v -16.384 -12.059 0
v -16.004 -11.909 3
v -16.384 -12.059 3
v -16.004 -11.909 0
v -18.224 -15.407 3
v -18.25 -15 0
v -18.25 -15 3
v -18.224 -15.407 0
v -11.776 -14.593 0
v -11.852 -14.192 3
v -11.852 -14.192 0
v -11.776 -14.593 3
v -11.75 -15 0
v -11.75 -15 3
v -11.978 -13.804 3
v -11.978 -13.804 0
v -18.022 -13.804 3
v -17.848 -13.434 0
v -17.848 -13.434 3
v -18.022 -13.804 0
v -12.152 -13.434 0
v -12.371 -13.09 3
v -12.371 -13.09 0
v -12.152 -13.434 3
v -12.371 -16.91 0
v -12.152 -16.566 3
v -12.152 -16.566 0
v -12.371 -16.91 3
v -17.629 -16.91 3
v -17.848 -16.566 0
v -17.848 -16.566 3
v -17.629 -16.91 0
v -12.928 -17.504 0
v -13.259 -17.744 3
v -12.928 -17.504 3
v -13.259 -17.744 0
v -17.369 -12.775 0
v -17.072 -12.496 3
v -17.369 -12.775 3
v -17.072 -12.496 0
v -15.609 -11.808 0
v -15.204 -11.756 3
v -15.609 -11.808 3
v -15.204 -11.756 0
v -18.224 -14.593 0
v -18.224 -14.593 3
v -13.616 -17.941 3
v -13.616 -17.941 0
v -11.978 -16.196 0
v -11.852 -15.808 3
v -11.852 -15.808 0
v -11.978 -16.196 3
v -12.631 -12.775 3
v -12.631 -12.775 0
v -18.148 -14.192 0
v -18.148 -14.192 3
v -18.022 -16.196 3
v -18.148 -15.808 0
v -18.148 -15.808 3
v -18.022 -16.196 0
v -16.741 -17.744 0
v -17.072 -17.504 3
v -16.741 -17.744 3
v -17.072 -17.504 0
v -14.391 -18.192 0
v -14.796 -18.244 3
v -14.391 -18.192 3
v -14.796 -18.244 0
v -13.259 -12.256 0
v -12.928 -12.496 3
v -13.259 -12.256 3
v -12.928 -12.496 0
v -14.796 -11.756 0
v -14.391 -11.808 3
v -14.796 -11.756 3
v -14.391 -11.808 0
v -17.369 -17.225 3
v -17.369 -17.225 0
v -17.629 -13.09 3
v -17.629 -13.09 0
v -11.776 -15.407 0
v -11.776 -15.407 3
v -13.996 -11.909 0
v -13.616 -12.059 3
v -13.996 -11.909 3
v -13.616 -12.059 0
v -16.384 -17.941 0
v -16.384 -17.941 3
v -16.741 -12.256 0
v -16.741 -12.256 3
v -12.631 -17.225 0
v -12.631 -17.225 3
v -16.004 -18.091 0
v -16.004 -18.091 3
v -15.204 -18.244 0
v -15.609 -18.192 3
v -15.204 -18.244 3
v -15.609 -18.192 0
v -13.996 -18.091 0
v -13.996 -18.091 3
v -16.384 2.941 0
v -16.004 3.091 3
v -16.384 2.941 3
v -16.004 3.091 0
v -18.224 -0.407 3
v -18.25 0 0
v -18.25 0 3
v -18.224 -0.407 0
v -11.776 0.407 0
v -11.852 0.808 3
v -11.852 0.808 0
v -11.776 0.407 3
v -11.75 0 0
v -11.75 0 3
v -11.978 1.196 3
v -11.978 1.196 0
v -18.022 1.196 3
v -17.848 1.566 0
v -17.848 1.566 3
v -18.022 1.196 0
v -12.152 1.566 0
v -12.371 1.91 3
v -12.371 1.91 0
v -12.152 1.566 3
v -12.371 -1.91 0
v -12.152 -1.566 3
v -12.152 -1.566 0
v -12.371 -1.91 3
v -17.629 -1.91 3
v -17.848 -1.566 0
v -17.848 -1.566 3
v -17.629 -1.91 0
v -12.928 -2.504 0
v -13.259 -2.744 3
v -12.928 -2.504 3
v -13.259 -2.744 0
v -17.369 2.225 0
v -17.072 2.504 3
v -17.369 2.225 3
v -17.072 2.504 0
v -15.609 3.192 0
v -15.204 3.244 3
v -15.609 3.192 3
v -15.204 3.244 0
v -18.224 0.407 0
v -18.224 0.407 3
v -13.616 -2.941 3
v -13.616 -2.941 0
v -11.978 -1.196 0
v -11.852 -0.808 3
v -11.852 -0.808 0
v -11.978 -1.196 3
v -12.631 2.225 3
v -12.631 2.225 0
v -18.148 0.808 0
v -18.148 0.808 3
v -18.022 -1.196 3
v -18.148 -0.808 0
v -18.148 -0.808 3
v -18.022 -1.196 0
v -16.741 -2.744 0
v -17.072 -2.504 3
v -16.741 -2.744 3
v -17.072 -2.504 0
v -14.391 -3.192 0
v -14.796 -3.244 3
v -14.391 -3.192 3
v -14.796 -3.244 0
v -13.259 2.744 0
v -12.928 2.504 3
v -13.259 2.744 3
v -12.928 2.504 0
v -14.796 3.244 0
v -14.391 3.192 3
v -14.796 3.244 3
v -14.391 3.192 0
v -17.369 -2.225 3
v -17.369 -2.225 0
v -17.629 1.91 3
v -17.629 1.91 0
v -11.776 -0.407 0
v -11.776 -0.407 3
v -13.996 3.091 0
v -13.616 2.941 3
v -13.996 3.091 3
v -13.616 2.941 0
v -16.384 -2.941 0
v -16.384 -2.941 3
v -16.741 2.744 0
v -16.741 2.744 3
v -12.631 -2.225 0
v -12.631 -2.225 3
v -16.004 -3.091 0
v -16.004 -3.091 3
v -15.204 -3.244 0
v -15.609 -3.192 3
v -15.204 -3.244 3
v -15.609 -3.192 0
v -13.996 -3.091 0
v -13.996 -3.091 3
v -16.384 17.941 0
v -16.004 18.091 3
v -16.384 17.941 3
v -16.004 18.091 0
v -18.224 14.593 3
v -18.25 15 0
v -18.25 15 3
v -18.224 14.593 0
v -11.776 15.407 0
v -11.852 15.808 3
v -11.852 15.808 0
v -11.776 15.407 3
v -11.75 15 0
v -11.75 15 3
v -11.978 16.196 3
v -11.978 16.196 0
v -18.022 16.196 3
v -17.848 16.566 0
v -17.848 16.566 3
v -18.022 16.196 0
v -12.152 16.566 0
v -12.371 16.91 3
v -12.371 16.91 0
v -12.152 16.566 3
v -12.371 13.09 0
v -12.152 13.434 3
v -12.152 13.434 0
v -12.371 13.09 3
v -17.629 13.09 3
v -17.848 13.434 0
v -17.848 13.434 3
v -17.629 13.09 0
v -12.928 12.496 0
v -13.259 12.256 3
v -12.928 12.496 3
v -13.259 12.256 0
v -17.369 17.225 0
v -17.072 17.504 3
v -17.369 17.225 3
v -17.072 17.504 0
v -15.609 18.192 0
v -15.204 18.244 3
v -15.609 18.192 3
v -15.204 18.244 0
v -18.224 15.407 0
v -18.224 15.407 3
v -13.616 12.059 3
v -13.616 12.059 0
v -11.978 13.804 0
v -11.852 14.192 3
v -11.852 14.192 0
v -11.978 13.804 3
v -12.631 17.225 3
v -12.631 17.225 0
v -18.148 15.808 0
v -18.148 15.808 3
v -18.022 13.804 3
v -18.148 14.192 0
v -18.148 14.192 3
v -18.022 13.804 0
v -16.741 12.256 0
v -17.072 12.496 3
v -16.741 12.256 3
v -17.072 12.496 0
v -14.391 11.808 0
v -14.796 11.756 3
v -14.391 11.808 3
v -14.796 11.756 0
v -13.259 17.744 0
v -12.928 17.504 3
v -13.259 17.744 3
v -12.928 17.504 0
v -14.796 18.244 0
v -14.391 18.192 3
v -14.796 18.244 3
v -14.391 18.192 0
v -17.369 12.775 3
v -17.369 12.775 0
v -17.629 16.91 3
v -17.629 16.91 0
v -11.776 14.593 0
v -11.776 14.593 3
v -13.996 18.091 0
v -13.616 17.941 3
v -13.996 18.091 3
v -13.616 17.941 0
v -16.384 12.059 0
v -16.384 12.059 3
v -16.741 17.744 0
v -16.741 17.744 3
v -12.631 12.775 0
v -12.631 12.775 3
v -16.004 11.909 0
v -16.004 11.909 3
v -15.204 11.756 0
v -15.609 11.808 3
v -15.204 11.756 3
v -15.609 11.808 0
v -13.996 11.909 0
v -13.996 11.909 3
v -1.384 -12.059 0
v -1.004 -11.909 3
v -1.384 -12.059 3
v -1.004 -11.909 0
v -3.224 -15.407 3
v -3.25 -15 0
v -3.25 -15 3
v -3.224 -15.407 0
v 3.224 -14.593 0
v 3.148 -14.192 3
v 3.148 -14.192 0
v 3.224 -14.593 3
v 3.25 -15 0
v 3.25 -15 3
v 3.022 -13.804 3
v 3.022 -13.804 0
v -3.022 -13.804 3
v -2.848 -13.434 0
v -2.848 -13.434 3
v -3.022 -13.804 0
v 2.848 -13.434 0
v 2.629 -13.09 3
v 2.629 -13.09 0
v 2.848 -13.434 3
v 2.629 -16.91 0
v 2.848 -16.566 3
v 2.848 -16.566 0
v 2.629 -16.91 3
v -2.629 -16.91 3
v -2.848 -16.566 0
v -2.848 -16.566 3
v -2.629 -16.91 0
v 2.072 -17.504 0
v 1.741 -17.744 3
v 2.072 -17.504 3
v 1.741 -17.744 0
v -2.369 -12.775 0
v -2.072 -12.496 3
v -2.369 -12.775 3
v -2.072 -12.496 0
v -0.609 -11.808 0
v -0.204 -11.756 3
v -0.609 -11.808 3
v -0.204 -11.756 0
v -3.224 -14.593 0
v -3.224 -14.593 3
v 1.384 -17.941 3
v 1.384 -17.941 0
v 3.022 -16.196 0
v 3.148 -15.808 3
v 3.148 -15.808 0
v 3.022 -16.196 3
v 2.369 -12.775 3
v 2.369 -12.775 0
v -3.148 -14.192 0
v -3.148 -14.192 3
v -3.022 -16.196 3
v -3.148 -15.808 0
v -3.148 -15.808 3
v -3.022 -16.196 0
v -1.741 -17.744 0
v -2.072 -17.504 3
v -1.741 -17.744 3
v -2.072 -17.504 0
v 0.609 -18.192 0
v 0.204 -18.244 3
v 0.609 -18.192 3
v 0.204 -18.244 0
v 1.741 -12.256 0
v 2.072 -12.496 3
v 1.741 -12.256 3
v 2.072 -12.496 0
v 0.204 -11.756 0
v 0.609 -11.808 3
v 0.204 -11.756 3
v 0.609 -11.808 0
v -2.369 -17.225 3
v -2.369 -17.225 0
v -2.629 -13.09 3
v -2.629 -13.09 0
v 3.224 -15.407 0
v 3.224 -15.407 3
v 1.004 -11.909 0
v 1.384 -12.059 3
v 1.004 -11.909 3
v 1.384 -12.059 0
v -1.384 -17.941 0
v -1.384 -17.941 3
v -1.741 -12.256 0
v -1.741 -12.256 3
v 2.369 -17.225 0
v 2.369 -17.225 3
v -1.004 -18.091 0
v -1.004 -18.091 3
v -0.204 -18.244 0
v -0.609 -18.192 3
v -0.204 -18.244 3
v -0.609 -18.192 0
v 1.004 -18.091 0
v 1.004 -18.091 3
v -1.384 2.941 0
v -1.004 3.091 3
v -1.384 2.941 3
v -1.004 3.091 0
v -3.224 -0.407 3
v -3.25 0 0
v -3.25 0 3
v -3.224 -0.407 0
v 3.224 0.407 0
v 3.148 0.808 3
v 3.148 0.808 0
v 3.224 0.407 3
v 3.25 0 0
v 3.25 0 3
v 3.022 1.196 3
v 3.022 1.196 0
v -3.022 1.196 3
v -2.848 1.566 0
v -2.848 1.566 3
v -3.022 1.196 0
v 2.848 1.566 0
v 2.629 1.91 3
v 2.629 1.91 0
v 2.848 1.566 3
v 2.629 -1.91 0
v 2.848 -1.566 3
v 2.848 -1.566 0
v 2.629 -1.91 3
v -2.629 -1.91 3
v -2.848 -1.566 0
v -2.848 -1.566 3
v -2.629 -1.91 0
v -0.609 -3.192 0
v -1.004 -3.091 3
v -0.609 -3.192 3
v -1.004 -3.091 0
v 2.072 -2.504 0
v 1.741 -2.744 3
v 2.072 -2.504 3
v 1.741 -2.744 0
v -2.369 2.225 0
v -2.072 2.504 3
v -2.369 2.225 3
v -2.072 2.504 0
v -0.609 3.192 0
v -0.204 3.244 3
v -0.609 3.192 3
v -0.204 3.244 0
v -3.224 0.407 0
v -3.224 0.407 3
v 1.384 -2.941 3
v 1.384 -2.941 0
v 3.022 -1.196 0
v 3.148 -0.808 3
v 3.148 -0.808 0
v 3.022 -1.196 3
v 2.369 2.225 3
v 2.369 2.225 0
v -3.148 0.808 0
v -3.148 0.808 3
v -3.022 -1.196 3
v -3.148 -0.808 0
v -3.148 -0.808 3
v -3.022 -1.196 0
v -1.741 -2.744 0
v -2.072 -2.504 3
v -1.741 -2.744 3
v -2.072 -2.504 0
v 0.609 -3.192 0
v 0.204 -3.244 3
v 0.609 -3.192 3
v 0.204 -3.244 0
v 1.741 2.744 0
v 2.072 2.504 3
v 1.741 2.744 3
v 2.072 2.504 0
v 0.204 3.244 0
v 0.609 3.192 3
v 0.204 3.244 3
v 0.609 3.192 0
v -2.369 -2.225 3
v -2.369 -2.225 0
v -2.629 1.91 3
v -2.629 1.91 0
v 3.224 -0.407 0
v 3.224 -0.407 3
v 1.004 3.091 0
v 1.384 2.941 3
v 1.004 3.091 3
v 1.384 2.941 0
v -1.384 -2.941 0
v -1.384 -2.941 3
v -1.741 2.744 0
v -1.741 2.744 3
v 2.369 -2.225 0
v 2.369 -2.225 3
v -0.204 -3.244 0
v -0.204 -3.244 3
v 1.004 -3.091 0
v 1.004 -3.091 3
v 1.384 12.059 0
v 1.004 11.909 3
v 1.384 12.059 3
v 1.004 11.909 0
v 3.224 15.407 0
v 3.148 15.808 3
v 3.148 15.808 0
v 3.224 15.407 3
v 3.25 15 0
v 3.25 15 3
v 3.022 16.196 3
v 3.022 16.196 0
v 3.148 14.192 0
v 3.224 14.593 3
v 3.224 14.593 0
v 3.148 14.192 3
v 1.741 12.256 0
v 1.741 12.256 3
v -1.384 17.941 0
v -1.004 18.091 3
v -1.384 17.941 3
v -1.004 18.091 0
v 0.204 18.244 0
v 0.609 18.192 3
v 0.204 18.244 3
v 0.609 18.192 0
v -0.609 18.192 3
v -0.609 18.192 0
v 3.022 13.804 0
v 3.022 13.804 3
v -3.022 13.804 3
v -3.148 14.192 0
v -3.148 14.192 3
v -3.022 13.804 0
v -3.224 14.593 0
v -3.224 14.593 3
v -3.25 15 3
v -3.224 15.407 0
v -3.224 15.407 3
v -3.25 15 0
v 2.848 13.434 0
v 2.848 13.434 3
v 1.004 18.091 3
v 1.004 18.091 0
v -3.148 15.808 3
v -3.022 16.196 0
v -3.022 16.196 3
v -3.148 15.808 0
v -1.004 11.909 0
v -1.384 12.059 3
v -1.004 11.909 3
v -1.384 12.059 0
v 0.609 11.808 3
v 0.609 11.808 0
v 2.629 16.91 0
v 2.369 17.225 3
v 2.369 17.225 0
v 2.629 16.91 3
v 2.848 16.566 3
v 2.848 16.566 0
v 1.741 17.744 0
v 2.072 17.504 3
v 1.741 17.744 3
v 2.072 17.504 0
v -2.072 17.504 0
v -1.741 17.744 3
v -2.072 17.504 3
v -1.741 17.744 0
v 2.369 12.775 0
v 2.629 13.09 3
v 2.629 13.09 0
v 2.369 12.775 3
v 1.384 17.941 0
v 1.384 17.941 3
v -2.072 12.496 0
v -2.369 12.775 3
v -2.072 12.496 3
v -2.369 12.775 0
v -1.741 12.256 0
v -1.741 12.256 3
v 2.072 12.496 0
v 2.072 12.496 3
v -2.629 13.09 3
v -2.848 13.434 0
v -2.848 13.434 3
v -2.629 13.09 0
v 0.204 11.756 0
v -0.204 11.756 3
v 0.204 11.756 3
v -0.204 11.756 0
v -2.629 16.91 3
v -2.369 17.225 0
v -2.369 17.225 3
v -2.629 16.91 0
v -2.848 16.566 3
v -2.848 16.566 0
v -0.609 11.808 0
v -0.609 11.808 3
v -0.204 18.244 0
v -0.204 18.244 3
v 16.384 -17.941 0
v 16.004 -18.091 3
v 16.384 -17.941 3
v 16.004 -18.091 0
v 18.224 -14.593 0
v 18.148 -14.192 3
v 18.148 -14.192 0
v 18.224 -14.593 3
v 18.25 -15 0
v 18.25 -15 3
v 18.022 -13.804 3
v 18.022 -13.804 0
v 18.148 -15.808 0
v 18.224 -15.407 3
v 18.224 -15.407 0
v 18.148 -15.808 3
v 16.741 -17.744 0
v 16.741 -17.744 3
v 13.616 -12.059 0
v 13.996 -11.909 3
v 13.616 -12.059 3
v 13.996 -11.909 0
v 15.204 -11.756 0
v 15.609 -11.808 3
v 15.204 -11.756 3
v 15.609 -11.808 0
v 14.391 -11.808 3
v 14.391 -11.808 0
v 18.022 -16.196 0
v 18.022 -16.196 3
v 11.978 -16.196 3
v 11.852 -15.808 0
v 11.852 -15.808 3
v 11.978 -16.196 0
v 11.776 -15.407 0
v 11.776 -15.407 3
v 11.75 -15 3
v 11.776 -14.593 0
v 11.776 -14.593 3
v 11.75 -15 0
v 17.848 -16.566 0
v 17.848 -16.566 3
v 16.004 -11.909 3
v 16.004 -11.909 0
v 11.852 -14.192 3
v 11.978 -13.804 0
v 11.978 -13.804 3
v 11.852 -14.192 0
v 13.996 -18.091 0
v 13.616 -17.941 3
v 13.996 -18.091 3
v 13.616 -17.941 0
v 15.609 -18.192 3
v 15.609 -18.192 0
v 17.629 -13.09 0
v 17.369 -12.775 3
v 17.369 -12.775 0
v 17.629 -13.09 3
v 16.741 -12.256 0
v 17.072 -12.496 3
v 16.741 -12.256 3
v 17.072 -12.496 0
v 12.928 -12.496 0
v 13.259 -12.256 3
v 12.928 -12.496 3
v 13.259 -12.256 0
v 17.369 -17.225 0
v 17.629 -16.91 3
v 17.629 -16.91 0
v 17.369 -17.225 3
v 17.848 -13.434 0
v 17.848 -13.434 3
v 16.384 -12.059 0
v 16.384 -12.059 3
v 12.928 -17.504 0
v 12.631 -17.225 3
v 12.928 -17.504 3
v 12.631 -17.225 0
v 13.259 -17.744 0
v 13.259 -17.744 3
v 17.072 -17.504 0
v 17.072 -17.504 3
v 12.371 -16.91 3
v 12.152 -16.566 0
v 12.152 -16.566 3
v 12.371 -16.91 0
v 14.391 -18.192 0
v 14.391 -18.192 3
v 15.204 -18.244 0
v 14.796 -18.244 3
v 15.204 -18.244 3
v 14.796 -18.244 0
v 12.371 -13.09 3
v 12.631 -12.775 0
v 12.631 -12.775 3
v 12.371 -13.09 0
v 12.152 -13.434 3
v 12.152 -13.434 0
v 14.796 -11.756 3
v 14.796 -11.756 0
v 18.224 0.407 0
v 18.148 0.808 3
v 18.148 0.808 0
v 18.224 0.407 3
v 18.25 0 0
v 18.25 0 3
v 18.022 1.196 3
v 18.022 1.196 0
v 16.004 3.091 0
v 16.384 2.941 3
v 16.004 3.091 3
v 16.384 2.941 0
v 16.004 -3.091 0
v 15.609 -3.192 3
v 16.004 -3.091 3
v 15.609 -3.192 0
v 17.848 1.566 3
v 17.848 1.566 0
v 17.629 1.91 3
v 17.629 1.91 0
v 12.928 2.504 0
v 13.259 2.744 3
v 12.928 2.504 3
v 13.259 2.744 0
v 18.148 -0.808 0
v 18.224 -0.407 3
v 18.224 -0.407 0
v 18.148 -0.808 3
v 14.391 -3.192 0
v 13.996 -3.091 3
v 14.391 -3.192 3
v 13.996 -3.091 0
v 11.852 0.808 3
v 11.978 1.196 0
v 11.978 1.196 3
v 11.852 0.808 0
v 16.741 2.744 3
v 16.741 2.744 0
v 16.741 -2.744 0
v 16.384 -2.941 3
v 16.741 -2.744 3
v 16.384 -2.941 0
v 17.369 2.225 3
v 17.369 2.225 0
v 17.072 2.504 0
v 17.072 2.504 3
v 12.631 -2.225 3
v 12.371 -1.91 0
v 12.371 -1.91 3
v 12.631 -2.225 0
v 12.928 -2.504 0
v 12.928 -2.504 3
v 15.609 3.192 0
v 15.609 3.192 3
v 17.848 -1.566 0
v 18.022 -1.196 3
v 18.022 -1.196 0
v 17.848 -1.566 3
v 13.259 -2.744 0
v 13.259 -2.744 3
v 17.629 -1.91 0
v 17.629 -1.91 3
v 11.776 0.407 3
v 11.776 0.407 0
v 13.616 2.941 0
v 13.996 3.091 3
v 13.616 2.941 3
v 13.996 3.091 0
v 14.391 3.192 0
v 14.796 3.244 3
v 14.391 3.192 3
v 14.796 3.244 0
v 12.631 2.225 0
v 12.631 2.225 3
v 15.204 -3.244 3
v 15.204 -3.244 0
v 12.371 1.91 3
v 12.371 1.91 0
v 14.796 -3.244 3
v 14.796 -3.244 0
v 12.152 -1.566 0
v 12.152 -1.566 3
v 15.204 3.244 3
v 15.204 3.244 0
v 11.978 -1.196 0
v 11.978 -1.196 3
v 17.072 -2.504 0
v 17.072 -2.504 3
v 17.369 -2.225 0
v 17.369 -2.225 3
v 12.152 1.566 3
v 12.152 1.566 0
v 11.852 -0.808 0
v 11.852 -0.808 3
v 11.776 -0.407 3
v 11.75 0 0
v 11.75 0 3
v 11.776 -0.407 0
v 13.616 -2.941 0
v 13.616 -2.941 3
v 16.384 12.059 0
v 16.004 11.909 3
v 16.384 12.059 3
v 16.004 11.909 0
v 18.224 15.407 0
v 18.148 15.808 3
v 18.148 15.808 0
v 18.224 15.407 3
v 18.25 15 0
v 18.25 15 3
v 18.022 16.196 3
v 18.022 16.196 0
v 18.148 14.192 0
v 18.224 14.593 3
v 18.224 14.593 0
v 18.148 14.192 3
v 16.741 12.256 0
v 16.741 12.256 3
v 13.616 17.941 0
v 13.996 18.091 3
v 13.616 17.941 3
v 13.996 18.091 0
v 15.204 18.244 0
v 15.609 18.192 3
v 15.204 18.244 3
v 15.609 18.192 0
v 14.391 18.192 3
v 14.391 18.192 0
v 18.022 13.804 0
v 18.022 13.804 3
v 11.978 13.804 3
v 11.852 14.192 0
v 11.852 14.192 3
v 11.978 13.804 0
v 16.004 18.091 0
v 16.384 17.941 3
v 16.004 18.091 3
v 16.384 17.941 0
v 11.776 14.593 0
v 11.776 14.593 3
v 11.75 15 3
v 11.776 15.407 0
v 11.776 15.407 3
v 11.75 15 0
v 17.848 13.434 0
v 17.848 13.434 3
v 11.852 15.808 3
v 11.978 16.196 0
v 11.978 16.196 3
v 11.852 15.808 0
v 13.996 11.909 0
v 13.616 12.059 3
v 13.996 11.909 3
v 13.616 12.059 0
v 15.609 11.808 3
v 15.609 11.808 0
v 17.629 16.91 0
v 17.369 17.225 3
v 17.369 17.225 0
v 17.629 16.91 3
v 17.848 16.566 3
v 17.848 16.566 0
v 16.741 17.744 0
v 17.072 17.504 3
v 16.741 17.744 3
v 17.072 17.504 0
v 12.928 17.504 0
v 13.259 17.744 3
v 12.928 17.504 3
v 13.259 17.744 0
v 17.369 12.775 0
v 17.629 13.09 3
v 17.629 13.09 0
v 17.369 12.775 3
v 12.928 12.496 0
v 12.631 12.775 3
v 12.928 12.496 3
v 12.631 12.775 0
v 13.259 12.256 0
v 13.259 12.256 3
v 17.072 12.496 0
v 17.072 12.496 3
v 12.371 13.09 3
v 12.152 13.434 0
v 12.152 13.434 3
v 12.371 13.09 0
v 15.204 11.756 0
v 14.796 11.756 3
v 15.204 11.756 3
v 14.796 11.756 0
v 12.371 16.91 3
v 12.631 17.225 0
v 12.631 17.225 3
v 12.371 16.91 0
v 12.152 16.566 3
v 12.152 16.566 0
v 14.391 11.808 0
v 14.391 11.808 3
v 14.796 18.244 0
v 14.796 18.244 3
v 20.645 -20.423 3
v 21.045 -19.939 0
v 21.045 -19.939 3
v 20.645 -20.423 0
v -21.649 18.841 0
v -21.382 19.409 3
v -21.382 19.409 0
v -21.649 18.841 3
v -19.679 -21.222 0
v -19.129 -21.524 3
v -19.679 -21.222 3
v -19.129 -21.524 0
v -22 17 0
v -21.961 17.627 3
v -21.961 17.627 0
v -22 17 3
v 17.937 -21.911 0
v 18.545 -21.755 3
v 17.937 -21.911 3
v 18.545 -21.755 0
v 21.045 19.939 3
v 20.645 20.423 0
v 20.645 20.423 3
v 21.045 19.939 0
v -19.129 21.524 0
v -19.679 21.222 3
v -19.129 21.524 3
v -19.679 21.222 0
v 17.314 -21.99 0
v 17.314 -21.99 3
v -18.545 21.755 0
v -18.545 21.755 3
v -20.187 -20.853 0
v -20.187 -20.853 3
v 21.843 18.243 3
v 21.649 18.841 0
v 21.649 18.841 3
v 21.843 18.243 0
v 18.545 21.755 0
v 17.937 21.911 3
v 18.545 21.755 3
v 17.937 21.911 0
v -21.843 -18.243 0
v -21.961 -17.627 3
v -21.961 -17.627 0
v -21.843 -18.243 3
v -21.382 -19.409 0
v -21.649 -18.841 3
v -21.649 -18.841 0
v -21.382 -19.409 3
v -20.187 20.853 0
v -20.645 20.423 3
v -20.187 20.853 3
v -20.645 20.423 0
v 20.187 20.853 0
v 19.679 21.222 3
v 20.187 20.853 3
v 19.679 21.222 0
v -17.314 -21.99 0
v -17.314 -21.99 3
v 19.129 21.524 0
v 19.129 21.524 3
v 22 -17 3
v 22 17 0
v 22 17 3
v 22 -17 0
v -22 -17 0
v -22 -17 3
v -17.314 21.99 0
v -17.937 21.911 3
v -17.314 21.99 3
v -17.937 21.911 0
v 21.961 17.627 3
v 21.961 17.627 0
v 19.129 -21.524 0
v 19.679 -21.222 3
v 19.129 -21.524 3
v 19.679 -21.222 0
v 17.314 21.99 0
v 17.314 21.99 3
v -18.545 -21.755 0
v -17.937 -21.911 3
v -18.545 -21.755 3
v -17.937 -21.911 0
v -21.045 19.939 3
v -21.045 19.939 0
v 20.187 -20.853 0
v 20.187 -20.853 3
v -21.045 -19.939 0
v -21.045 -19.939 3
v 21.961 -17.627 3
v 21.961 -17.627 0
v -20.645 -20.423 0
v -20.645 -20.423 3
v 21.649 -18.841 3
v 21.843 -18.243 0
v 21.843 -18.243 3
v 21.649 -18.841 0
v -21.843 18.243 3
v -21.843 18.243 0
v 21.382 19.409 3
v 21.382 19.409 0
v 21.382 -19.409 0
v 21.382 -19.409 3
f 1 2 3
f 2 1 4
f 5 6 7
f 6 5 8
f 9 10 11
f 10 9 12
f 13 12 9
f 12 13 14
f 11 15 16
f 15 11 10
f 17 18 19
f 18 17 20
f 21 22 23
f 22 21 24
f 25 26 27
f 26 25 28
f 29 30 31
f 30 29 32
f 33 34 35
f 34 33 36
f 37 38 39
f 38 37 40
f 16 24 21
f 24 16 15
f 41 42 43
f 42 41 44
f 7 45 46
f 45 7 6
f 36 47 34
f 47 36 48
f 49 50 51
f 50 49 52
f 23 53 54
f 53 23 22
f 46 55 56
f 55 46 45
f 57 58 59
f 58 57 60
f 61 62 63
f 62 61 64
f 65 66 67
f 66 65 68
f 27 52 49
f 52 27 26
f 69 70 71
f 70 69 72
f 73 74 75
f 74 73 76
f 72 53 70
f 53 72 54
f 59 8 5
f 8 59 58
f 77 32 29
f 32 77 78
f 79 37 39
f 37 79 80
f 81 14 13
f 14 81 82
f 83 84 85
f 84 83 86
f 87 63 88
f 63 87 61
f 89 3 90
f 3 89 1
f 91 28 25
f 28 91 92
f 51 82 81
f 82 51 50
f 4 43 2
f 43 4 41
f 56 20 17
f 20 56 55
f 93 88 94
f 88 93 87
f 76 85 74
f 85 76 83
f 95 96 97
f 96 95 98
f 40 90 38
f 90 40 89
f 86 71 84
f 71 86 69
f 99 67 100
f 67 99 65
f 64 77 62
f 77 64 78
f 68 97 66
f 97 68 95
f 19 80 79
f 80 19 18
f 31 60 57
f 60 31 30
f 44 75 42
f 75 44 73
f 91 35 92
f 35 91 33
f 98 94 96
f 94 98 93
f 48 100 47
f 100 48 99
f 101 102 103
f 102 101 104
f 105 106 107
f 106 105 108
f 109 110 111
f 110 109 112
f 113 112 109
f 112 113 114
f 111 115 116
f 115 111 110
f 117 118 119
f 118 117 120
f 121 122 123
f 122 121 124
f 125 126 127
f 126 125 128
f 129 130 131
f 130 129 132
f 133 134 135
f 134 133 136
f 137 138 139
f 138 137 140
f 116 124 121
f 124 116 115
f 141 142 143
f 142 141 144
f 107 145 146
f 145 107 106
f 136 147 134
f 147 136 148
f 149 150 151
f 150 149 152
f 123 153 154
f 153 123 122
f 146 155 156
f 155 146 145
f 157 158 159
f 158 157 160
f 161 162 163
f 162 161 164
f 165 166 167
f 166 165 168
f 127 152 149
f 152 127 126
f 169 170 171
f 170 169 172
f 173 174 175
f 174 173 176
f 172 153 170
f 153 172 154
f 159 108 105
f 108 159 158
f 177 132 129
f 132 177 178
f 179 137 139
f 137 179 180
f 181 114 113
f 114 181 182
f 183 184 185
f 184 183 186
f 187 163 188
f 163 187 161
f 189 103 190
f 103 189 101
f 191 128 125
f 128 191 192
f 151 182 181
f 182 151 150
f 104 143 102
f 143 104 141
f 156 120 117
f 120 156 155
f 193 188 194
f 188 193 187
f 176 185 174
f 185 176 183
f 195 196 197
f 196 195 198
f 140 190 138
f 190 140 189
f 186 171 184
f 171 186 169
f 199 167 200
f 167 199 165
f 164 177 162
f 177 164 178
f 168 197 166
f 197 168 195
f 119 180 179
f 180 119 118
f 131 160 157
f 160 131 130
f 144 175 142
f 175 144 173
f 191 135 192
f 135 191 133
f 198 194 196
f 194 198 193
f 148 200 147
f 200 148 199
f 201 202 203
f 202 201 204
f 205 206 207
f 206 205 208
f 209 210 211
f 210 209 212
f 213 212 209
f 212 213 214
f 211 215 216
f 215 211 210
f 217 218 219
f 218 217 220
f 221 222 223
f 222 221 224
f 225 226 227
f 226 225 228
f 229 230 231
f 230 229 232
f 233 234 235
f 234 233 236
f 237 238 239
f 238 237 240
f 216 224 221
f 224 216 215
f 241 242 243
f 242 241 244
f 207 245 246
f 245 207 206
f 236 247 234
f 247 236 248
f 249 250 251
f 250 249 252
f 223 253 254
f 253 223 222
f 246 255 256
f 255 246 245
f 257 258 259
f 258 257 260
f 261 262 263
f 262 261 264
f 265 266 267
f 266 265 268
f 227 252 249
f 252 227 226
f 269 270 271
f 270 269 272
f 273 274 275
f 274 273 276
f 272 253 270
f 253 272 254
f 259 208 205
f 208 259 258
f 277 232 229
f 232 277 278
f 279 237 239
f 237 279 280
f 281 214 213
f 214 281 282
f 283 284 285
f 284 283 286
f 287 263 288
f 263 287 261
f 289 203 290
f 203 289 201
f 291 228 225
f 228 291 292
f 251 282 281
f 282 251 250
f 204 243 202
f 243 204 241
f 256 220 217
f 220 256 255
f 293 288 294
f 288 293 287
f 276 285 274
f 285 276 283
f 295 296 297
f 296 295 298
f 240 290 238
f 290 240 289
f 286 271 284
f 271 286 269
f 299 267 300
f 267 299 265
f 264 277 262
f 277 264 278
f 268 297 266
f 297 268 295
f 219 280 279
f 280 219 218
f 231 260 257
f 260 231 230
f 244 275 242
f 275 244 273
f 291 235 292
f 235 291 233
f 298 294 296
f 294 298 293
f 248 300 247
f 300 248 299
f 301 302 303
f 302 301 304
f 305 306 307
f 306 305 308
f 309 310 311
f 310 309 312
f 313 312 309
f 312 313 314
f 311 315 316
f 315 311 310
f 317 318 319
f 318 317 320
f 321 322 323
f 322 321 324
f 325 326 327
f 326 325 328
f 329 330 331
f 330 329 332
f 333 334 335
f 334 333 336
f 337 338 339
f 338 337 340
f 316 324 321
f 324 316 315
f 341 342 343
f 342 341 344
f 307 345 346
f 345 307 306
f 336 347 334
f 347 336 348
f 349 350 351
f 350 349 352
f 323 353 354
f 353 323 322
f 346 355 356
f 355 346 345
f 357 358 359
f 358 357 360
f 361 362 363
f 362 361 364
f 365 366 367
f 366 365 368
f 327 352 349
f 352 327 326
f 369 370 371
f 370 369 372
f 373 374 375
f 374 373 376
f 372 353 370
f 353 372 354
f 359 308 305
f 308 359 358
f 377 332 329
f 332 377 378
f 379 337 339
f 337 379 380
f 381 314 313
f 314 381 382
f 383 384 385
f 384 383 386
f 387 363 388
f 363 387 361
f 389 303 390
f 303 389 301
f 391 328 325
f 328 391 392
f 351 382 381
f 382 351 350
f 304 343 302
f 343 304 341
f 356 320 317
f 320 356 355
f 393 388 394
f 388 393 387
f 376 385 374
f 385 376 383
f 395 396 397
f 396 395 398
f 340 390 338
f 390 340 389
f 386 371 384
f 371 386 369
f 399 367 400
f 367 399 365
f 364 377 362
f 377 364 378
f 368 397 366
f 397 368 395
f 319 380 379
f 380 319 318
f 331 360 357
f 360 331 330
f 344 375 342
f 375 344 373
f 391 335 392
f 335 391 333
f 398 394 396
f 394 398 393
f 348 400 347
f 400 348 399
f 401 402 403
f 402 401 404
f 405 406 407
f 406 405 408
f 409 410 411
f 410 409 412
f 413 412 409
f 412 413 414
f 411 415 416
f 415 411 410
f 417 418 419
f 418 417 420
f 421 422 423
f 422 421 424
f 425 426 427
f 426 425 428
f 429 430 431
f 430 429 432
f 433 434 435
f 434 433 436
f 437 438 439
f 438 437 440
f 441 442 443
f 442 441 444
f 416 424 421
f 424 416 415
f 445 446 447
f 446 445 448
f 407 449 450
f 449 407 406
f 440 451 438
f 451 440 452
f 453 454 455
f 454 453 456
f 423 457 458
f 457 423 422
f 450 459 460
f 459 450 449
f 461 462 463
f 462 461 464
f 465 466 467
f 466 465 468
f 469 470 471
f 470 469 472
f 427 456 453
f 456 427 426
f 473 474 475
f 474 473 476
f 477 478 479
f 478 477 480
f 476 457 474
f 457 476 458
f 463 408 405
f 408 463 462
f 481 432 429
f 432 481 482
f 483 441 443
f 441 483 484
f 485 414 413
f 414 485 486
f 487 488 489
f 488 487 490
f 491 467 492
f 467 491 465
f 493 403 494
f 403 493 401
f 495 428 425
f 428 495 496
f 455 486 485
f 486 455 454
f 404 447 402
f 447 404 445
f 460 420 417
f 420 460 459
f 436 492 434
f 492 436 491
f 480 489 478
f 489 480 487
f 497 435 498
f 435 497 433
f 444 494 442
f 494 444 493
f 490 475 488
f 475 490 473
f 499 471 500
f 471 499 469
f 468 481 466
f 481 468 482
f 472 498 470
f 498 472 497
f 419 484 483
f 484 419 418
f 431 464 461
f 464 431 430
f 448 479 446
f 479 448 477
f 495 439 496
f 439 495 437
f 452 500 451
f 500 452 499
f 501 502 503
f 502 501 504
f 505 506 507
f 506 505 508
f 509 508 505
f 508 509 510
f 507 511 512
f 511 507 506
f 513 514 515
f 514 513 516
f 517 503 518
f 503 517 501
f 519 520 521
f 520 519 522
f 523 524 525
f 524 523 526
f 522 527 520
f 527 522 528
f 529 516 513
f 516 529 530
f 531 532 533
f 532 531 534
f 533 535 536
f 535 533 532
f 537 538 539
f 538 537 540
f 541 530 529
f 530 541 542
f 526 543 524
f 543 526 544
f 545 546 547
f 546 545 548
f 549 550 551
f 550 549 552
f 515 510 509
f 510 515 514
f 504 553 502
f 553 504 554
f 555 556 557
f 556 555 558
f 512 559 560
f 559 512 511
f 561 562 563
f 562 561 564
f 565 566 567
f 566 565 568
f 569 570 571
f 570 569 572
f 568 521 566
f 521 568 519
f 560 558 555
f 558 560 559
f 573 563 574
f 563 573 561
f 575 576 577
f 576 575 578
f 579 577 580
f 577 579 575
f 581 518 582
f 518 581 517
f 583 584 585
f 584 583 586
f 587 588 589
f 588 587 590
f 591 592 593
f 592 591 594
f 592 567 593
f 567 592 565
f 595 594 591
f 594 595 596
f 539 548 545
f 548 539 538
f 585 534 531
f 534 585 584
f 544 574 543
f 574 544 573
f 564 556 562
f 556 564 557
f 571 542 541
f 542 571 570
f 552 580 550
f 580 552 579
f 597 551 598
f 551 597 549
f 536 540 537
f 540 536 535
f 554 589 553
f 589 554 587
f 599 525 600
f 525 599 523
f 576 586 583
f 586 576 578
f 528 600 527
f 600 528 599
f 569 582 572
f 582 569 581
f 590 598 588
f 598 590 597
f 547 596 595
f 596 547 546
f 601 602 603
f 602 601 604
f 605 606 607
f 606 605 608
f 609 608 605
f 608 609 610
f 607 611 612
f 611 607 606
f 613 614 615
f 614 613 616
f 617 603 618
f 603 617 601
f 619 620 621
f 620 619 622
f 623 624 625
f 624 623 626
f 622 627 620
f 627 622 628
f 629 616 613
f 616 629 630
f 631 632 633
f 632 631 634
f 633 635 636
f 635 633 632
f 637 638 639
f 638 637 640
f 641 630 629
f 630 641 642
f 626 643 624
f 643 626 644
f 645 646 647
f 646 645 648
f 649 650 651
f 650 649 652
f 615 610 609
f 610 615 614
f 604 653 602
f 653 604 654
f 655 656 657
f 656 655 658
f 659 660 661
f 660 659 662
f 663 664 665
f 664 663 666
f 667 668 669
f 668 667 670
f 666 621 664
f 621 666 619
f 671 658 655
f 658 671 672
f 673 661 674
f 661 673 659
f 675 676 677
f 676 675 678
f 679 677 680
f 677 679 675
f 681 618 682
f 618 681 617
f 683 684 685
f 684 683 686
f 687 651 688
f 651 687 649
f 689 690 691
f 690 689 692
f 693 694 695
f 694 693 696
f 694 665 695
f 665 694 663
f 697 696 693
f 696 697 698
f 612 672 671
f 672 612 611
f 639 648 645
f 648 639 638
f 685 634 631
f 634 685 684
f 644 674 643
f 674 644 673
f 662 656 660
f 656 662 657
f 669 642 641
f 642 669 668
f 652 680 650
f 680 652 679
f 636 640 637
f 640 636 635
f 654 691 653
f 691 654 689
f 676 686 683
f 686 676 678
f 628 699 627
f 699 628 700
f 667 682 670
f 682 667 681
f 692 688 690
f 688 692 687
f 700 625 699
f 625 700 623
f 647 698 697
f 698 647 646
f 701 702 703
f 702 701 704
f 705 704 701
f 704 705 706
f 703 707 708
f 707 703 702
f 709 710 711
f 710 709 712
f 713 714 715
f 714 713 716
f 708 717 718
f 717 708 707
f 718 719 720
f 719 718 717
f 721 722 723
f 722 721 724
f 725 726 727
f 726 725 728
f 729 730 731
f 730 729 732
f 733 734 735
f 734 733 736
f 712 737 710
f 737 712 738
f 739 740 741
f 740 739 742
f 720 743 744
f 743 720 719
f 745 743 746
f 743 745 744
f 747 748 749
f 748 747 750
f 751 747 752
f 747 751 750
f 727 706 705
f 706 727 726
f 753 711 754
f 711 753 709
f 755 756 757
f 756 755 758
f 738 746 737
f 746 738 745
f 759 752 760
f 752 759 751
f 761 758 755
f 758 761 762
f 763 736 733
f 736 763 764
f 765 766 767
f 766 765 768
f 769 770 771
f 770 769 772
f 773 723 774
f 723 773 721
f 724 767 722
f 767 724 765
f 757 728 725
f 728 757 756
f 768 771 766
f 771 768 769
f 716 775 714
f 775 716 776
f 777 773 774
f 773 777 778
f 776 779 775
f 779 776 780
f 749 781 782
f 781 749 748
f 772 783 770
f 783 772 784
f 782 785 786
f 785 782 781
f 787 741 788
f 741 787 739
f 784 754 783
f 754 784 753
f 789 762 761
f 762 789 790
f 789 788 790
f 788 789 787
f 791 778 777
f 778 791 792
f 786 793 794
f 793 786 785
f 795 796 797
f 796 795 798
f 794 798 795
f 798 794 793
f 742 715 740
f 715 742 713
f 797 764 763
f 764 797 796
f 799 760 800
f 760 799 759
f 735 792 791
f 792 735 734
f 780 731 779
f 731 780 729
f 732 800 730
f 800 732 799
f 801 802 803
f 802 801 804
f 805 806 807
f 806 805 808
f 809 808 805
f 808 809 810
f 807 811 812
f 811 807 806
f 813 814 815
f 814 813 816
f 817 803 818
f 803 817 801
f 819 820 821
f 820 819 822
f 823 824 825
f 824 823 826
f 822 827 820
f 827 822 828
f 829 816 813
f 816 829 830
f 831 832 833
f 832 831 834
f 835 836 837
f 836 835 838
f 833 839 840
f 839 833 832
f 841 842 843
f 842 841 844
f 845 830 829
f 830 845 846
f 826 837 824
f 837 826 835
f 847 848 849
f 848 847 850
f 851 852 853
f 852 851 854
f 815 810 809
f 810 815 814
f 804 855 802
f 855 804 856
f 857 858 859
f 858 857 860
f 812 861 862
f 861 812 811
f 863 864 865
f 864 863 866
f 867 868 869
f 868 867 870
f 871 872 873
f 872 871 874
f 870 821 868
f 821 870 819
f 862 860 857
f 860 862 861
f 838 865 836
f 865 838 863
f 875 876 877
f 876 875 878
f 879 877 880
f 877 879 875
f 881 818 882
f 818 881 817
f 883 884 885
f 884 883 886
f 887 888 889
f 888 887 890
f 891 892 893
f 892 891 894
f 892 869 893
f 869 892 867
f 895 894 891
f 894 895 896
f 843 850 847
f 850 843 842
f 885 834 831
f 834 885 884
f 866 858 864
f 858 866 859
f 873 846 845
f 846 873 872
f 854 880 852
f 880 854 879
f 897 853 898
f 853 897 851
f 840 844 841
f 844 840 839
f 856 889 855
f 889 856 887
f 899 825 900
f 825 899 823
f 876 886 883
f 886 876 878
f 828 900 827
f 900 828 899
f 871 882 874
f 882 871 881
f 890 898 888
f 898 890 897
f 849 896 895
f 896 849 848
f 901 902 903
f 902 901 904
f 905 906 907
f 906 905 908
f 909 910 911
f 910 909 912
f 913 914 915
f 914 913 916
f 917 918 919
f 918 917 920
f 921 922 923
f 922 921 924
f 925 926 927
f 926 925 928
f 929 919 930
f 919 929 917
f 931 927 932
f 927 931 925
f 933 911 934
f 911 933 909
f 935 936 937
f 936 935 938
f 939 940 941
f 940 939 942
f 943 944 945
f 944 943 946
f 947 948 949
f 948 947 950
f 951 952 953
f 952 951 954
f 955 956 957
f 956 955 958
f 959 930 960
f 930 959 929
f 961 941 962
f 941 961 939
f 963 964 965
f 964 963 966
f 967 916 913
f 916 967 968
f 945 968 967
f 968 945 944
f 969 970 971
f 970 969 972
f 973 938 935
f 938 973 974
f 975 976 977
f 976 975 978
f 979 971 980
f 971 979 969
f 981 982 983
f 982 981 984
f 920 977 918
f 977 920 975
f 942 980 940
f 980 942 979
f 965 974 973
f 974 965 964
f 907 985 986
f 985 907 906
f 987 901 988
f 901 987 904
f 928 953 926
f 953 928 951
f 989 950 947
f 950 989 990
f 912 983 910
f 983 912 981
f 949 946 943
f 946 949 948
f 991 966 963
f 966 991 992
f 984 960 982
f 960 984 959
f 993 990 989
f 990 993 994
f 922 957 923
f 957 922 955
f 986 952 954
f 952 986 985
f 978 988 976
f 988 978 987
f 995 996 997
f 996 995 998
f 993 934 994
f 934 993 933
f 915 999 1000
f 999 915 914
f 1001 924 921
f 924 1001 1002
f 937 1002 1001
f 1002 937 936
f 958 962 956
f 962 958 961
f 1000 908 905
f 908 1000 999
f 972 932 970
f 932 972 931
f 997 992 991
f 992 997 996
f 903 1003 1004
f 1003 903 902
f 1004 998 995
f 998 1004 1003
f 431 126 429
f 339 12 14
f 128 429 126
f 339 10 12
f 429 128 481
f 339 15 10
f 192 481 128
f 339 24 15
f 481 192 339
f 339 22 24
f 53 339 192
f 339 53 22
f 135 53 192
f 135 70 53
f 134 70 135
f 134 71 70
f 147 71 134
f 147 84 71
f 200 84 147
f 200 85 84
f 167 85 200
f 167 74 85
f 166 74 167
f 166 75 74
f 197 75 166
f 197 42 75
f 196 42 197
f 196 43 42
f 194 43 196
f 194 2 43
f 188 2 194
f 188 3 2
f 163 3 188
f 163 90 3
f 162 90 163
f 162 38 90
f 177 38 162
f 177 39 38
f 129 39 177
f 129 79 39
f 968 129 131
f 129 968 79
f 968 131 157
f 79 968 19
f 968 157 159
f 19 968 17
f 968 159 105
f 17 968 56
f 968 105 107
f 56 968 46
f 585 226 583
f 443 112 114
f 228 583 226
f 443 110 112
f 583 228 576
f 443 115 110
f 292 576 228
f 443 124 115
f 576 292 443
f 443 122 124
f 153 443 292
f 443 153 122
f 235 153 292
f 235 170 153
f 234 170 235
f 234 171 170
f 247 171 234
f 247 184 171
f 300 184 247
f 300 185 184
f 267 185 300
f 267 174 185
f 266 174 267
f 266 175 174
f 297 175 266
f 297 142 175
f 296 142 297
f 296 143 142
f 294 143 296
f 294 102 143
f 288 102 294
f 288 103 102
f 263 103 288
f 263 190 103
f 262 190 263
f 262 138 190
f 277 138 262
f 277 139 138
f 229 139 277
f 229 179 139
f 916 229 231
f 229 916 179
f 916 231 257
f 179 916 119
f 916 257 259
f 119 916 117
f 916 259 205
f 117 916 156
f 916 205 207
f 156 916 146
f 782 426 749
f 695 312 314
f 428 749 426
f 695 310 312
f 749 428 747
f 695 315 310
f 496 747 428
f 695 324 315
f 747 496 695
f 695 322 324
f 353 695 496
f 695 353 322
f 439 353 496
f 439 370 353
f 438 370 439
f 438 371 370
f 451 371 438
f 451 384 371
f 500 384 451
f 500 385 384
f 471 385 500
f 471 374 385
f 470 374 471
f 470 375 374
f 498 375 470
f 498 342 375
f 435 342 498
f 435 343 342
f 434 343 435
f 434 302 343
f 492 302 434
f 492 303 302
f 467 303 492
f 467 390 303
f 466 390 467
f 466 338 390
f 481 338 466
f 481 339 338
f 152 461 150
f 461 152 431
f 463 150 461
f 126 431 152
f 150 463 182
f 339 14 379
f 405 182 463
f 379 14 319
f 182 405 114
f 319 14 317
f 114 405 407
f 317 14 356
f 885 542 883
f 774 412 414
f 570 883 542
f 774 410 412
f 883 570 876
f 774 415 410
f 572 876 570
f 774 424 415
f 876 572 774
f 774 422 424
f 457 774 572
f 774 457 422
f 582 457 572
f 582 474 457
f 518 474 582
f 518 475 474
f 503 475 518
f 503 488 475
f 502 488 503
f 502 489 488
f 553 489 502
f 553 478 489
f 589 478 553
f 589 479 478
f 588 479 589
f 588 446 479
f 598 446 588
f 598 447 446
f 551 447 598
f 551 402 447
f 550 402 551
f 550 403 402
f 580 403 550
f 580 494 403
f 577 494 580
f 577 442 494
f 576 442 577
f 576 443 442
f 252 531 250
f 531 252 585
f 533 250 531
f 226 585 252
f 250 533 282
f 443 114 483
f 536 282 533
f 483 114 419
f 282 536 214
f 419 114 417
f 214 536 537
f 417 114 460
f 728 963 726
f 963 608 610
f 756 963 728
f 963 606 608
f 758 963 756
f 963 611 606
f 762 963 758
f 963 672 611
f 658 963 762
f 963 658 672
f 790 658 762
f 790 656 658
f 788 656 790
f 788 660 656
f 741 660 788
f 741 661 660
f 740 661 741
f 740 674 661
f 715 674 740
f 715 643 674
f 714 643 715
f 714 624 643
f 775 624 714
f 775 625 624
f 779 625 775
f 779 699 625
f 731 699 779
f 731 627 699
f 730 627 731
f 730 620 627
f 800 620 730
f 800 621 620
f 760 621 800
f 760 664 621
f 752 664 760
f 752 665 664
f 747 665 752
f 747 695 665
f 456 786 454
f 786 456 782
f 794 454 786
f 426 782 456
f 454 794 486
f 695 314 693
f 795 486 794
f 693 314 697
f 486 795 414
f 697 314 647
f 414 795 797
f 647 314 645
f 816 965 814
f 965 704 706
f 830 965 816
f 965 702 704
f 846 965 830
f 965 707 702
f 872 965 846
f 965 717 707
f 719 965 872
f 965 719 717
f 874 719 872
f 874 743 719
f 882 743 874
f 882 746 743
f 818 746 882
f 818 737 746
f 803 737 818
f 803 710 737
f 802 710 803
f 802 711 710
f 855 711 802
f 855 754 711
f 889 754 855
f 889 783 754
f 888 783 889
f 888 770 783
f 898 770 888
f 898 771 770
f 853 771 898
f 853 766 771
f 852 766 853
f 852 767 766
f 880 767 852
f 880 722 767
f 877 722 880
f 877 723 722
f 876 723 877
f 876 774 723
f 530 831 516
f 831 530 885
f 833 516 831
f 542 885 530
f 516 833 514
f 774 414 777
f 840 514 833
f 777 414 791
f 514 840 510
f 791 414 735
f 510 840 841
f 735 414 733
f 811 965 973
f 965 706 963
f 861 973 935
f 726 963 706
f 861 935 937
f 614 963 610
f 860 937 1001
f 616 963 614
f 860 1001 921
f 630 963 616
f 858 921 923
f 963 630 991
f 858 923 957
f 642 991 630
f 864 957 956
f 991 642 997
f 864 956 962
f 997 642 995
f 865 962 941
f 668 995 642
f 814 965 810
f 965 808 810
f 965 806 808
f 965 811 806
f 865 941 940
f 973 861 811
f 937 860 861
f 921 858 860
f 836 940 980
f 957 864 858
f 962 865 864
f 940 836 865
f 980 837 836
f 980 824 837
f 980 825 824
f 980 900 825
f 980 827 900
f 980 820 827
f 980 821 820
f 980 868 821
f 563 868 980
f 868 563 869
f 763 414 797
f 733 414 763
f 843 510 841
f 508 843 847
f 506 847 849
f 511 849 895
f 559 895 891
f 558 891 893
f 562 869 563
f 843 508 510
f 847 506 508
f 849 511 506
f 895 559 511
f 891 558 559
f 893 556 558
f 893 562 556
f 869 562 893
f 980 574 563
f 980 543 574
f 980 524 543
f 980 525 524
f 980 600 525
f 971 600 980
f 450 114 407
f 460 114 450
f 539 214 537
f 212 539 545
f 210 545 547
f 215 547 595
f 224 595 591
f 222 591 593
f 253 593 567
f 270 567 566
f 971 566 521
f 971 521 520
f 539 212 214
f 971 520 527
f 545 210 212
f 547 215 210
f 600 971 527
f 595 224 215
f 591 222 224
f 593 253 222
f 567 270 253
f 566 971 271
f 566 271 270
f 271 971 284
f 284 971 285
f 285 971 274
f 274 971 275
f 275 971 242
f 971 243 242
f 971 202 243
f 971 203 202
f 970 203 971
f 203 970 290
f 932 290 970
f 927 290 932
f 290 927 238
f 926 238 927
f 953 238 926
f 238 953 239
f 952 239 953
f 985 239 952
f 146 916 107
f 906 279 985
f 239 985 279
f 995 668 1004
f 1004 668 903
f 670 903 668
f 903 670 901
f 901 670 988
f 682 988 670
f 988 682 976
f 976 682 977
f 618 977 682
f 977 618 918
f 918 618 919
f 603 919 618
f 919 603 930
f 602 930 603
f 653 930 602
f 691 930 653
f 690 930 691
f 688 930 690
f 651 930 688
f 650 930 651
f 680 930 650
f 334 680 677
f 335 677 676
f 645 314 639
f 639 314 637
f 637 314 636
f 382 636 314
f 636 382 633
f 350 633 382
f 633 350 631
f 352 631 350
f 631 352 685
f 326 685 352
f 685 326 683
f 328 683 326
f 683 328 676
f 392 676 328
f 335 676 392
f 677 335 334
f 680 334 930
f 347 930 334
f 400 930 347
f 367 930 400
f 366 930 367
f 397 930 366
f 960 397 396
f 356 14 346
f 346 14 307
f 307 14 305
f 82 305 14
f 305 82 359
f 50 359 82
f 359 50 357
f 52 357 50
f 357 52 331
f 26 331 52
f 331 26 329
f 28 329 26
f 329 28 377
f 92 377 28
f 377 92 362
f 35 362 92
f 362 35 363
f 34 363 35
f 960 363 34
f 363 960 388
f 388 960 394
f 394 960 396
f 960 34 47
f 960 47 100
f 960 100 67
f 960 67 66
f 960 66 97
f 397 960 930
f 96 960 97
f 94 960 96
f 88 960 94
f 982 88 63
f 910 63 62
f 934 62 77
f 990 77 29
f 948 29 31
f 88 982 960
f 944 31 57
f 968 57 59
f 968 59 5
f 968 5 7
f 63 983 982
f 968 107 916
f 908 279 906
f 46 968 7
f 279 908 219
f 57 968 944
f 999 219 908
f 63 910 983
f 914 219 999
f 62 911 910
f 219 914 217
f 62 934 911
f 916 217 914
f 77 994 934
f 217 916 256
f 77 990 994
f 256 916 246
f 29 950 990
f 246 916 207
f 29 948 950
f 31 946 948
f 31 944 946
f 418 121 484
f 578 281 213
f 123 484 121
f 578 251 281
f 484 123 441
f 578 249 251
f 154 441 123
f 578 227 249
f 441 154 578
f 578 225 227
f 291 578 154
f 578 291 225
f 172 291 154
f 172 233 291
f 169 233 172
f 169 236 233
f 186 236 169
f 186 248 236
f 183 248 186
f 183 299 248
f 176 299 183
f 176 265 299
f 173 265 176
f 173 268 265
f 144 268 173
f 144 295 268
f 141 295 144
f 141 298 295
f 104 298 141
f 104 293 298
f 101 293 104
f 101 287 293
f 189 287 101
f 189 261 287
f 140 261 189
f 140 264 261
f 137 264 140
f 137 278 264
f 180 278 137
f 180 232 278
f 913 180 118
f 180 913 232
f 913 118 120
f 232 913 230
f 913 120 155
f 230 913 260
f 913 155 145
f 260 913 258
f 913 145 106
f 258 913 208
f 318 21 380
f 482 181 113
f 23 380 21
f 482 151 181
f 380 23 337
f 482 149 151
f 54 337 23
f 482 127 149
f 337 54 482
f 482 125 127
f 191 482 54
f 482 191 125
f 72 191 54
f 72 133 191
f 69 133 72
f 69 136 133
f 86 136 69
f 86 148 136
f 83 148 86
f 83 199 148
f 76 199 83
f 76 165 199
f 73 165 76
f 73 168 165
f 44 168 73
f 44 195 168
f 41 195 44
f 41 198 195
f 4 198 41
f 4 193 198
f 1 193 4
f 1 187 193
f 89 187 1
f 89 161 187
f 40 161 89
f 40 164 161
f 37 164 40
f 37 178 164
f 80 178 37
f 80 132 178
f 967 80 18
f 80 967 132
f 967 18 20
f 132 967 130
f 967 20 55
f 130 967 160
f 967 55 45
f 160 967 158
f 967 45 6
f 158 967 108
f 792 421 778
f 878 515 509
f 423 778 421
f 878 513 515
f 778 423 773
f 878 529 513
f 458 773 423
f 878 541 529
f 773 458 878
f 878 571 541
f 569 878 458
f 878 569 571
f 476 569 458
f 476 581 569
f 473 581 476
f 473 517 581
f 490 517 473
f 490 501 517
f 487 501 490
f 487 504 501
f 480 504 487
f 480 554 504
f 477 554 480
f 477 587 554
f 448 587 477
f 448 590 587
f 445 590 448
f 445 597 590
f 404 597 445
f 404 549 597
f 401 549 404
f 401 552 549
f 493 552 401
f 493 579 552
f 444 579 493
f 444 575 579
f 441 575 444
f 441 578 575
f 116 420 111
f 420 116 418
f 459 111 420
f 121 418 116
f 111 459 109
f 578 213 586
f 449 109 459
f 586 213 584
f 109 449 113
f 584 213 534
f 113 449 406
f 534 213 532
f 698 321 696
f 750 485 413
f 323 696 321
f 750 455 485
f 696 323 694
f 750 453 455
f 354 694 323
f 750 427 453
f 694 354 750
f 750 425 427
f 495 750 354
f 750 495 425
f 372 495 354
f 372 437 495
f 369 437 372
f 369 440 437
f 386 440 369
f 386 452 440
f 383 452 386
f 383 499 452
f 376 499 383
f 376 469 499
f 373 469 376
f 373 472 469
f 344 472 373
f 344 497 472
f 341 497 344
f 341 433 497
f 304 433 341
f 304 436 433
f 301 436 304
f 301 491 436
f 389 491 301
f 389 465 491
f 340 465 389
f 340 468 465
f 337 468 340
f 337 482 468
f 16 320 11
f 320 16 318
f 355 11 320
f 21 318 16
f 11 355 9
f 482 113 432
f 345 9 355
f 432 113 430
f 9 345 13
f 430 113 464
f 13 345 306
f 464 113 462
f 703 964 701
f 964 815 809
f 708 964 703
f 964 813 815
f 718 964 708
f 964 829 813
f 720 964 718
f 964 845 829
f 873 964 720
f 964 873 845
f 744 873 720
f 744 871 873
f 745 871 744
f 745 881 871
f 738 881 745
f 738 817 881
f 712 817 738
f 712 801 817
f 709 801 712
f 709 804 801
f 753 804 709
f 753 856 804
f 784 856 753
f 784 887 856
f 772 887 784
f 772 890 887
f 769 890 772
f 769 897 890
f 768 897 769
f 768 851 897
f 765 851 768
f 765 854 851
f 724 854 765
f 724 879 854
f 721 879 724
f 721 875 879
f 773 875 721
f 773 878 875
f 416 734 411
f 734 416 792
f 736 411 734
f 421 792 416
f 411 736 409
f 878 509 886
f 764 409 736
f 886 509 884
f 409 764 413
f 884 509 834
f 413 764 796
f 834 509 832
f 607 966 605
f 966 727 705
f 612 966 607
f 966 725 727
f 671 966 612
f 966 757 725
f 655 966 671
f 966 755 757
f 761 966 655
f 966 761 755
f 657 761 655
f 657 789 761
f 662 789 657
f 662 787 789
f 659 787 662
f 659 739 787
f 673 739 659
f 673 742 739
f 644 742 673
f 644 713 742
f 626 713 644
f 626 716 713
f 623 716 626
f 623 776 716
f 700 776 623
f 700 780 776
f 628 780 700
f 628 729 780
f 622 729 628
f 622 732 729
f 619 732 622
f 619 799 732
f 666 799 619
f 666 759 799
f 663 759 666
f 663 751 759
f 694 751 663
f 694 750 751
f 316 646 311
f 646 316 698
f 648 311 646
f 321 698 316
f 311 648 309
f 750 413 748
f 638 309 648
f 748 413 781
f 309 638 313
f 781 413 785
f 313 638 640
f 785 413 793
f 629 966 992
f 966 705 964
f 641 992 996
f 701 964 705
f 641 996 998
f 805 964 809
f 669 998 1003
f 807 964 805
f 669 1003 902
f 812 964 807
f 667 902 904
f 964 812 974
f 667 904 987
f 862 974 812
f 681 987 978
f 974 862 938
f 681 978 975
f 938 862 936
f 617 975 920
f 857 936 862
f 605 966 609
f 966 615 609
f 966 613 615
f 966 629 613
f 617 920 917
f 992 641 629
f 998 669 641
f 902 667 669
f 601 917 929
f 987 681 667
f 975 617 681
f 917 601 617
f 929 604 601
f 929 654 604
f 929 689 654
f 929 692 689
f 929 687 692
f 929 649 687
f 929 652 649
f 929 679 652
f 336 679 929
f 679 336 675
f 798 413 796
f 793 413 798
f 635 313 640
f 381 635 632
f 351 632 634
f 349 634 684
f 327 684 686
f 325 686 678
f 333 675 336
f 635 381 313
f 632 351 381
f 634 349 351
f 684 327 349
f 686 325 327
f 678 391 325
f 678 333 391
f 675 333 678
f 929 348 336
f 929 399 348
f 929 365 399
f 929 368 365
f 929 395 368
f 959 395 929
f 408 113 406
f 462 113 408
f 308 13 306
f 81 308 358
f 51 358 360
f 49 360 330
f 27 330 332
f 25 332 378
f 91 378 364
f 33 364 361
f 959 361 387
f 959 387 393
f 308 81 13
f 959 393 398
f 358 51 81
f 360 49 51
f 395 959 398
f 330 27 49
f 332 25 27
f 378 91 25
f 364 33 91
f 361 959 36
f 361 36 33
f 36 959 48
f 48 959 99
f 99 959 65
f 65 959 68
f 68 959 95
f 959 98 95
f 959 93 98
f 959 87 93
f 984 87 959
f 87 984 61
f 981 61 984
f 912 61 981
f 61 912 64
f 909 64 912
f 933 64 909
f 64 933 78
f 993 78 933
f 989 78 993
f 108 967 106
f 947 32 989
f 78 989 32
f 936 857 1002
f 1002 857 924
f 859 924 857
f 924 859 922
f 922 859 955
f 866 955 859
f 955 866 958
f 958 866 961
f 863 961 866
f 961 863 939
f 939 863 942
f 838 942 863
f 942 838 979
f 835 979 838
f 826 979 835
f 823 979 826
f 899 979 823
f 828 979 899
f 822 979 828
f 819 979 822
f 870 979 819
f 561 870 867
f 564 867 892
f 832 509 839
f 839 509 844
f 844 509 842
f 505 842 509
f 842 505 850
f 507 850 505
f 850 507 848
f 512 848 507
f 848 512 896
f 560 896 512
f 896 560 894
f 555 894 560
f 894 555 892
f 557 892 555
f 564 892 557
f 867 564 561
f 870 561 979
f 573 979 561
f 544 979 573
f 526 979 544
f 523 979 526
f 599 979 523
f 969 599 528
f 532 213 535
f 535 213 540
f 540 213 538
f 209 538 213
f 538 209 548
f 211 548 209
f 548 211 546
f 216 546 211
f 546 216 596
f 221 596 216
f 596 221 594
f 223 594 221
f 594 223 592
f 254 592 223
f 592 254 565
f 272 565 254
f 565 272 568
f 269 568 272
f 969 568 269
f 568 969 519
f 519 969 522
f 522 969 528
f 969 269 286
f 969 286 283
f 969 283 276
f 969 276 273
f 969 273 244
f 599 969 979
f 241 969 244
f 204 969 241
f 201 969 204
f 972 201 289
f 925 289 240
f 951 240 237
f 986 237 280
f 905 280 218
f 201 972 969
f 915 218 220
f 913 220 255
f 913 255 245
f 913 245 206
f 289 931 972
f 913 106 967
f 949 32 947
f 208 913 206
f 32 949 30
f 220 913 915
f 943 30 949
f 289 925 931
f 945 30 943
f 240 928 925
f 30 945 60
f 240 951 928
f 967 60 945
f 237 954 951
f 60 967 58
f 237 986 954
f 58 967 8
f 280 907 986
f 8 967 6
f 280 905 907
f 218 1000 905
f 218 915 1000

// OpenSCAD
$fn = 50;


difference() {
	union() {
		hull() {
			translate(v = [-17.0000000000, 17.0000000000, 0]) {
				cylinder(h = 3, r = 5);
			}
			translate(v = [17.0000000000, 17.0000000000, 0]) {
				cylinder(h = 3, r = 5);
			}
			translate(v = [-17.0000000000, -17.0000000000, 0]) {
				cylinder(h = 3, r = 5);
			}
			translate(v = [17.0000000000, -17.0000000000, 0]) {
				cylinder(h = 3, r = 5);
			}
		}
	}
	union() {
		translate(v = [-15.0000000000, -15.0000000000, 0]) {
			translate(v = [0, 0, -100]) {
				cylinder(h = 200, r = 3.2500000000);
			}
		}
		translate(v = [-15.0000000000, 0.0000000000, 0]) {
			translate(v = [0, 0, -100]) {
				cylinder(h = 200, r = 3.2500000000);
			}
		}
		translate(v = [-15.0000000000, 15.0000000000, 0]) {
			translate(v = [0, 0, -100]) {
				cylinder(h = 200, r = 3.2500000000);
			}
		}
		translate(v = [0.0000000000, -15.0000000000, 0]) {
			translate(v = [0, 0, -100]) {
				cylinder(h = 200, r = 3.2500000000);
			}
		}
		translate(v = [0, 0, -100]) {
			cylinder(h = 200, r = 3.2500000000);
		}
		translate(v = [0.0000000000, 15.0000000000, 0]) {
			translate(v = [0, 0, -100]) {
				cylinder(h = 200, r = 3.2500000000);
			}
		}
		translate(v = [15.0000000000, -15.0000000000, 0]) {
			translate(v = [0, 0, -100]) {
				cylinder(h = 200, r = 3.2500000000);
			}
		}
		translate(v = [15.0000000000, 0.0000000000, 0]) {
			translate(v = [0, 0, -100]) {
				cylinder(h = 200, r = 3.2500000000);
			}
		}
		translate(v = [15.0000000000, 15.0000000000, 0]) {
			translate(v = [0, 0, -100]) {
				cylinder(h = 200, r = 3.2500000000);
			}
		}
	}
}
